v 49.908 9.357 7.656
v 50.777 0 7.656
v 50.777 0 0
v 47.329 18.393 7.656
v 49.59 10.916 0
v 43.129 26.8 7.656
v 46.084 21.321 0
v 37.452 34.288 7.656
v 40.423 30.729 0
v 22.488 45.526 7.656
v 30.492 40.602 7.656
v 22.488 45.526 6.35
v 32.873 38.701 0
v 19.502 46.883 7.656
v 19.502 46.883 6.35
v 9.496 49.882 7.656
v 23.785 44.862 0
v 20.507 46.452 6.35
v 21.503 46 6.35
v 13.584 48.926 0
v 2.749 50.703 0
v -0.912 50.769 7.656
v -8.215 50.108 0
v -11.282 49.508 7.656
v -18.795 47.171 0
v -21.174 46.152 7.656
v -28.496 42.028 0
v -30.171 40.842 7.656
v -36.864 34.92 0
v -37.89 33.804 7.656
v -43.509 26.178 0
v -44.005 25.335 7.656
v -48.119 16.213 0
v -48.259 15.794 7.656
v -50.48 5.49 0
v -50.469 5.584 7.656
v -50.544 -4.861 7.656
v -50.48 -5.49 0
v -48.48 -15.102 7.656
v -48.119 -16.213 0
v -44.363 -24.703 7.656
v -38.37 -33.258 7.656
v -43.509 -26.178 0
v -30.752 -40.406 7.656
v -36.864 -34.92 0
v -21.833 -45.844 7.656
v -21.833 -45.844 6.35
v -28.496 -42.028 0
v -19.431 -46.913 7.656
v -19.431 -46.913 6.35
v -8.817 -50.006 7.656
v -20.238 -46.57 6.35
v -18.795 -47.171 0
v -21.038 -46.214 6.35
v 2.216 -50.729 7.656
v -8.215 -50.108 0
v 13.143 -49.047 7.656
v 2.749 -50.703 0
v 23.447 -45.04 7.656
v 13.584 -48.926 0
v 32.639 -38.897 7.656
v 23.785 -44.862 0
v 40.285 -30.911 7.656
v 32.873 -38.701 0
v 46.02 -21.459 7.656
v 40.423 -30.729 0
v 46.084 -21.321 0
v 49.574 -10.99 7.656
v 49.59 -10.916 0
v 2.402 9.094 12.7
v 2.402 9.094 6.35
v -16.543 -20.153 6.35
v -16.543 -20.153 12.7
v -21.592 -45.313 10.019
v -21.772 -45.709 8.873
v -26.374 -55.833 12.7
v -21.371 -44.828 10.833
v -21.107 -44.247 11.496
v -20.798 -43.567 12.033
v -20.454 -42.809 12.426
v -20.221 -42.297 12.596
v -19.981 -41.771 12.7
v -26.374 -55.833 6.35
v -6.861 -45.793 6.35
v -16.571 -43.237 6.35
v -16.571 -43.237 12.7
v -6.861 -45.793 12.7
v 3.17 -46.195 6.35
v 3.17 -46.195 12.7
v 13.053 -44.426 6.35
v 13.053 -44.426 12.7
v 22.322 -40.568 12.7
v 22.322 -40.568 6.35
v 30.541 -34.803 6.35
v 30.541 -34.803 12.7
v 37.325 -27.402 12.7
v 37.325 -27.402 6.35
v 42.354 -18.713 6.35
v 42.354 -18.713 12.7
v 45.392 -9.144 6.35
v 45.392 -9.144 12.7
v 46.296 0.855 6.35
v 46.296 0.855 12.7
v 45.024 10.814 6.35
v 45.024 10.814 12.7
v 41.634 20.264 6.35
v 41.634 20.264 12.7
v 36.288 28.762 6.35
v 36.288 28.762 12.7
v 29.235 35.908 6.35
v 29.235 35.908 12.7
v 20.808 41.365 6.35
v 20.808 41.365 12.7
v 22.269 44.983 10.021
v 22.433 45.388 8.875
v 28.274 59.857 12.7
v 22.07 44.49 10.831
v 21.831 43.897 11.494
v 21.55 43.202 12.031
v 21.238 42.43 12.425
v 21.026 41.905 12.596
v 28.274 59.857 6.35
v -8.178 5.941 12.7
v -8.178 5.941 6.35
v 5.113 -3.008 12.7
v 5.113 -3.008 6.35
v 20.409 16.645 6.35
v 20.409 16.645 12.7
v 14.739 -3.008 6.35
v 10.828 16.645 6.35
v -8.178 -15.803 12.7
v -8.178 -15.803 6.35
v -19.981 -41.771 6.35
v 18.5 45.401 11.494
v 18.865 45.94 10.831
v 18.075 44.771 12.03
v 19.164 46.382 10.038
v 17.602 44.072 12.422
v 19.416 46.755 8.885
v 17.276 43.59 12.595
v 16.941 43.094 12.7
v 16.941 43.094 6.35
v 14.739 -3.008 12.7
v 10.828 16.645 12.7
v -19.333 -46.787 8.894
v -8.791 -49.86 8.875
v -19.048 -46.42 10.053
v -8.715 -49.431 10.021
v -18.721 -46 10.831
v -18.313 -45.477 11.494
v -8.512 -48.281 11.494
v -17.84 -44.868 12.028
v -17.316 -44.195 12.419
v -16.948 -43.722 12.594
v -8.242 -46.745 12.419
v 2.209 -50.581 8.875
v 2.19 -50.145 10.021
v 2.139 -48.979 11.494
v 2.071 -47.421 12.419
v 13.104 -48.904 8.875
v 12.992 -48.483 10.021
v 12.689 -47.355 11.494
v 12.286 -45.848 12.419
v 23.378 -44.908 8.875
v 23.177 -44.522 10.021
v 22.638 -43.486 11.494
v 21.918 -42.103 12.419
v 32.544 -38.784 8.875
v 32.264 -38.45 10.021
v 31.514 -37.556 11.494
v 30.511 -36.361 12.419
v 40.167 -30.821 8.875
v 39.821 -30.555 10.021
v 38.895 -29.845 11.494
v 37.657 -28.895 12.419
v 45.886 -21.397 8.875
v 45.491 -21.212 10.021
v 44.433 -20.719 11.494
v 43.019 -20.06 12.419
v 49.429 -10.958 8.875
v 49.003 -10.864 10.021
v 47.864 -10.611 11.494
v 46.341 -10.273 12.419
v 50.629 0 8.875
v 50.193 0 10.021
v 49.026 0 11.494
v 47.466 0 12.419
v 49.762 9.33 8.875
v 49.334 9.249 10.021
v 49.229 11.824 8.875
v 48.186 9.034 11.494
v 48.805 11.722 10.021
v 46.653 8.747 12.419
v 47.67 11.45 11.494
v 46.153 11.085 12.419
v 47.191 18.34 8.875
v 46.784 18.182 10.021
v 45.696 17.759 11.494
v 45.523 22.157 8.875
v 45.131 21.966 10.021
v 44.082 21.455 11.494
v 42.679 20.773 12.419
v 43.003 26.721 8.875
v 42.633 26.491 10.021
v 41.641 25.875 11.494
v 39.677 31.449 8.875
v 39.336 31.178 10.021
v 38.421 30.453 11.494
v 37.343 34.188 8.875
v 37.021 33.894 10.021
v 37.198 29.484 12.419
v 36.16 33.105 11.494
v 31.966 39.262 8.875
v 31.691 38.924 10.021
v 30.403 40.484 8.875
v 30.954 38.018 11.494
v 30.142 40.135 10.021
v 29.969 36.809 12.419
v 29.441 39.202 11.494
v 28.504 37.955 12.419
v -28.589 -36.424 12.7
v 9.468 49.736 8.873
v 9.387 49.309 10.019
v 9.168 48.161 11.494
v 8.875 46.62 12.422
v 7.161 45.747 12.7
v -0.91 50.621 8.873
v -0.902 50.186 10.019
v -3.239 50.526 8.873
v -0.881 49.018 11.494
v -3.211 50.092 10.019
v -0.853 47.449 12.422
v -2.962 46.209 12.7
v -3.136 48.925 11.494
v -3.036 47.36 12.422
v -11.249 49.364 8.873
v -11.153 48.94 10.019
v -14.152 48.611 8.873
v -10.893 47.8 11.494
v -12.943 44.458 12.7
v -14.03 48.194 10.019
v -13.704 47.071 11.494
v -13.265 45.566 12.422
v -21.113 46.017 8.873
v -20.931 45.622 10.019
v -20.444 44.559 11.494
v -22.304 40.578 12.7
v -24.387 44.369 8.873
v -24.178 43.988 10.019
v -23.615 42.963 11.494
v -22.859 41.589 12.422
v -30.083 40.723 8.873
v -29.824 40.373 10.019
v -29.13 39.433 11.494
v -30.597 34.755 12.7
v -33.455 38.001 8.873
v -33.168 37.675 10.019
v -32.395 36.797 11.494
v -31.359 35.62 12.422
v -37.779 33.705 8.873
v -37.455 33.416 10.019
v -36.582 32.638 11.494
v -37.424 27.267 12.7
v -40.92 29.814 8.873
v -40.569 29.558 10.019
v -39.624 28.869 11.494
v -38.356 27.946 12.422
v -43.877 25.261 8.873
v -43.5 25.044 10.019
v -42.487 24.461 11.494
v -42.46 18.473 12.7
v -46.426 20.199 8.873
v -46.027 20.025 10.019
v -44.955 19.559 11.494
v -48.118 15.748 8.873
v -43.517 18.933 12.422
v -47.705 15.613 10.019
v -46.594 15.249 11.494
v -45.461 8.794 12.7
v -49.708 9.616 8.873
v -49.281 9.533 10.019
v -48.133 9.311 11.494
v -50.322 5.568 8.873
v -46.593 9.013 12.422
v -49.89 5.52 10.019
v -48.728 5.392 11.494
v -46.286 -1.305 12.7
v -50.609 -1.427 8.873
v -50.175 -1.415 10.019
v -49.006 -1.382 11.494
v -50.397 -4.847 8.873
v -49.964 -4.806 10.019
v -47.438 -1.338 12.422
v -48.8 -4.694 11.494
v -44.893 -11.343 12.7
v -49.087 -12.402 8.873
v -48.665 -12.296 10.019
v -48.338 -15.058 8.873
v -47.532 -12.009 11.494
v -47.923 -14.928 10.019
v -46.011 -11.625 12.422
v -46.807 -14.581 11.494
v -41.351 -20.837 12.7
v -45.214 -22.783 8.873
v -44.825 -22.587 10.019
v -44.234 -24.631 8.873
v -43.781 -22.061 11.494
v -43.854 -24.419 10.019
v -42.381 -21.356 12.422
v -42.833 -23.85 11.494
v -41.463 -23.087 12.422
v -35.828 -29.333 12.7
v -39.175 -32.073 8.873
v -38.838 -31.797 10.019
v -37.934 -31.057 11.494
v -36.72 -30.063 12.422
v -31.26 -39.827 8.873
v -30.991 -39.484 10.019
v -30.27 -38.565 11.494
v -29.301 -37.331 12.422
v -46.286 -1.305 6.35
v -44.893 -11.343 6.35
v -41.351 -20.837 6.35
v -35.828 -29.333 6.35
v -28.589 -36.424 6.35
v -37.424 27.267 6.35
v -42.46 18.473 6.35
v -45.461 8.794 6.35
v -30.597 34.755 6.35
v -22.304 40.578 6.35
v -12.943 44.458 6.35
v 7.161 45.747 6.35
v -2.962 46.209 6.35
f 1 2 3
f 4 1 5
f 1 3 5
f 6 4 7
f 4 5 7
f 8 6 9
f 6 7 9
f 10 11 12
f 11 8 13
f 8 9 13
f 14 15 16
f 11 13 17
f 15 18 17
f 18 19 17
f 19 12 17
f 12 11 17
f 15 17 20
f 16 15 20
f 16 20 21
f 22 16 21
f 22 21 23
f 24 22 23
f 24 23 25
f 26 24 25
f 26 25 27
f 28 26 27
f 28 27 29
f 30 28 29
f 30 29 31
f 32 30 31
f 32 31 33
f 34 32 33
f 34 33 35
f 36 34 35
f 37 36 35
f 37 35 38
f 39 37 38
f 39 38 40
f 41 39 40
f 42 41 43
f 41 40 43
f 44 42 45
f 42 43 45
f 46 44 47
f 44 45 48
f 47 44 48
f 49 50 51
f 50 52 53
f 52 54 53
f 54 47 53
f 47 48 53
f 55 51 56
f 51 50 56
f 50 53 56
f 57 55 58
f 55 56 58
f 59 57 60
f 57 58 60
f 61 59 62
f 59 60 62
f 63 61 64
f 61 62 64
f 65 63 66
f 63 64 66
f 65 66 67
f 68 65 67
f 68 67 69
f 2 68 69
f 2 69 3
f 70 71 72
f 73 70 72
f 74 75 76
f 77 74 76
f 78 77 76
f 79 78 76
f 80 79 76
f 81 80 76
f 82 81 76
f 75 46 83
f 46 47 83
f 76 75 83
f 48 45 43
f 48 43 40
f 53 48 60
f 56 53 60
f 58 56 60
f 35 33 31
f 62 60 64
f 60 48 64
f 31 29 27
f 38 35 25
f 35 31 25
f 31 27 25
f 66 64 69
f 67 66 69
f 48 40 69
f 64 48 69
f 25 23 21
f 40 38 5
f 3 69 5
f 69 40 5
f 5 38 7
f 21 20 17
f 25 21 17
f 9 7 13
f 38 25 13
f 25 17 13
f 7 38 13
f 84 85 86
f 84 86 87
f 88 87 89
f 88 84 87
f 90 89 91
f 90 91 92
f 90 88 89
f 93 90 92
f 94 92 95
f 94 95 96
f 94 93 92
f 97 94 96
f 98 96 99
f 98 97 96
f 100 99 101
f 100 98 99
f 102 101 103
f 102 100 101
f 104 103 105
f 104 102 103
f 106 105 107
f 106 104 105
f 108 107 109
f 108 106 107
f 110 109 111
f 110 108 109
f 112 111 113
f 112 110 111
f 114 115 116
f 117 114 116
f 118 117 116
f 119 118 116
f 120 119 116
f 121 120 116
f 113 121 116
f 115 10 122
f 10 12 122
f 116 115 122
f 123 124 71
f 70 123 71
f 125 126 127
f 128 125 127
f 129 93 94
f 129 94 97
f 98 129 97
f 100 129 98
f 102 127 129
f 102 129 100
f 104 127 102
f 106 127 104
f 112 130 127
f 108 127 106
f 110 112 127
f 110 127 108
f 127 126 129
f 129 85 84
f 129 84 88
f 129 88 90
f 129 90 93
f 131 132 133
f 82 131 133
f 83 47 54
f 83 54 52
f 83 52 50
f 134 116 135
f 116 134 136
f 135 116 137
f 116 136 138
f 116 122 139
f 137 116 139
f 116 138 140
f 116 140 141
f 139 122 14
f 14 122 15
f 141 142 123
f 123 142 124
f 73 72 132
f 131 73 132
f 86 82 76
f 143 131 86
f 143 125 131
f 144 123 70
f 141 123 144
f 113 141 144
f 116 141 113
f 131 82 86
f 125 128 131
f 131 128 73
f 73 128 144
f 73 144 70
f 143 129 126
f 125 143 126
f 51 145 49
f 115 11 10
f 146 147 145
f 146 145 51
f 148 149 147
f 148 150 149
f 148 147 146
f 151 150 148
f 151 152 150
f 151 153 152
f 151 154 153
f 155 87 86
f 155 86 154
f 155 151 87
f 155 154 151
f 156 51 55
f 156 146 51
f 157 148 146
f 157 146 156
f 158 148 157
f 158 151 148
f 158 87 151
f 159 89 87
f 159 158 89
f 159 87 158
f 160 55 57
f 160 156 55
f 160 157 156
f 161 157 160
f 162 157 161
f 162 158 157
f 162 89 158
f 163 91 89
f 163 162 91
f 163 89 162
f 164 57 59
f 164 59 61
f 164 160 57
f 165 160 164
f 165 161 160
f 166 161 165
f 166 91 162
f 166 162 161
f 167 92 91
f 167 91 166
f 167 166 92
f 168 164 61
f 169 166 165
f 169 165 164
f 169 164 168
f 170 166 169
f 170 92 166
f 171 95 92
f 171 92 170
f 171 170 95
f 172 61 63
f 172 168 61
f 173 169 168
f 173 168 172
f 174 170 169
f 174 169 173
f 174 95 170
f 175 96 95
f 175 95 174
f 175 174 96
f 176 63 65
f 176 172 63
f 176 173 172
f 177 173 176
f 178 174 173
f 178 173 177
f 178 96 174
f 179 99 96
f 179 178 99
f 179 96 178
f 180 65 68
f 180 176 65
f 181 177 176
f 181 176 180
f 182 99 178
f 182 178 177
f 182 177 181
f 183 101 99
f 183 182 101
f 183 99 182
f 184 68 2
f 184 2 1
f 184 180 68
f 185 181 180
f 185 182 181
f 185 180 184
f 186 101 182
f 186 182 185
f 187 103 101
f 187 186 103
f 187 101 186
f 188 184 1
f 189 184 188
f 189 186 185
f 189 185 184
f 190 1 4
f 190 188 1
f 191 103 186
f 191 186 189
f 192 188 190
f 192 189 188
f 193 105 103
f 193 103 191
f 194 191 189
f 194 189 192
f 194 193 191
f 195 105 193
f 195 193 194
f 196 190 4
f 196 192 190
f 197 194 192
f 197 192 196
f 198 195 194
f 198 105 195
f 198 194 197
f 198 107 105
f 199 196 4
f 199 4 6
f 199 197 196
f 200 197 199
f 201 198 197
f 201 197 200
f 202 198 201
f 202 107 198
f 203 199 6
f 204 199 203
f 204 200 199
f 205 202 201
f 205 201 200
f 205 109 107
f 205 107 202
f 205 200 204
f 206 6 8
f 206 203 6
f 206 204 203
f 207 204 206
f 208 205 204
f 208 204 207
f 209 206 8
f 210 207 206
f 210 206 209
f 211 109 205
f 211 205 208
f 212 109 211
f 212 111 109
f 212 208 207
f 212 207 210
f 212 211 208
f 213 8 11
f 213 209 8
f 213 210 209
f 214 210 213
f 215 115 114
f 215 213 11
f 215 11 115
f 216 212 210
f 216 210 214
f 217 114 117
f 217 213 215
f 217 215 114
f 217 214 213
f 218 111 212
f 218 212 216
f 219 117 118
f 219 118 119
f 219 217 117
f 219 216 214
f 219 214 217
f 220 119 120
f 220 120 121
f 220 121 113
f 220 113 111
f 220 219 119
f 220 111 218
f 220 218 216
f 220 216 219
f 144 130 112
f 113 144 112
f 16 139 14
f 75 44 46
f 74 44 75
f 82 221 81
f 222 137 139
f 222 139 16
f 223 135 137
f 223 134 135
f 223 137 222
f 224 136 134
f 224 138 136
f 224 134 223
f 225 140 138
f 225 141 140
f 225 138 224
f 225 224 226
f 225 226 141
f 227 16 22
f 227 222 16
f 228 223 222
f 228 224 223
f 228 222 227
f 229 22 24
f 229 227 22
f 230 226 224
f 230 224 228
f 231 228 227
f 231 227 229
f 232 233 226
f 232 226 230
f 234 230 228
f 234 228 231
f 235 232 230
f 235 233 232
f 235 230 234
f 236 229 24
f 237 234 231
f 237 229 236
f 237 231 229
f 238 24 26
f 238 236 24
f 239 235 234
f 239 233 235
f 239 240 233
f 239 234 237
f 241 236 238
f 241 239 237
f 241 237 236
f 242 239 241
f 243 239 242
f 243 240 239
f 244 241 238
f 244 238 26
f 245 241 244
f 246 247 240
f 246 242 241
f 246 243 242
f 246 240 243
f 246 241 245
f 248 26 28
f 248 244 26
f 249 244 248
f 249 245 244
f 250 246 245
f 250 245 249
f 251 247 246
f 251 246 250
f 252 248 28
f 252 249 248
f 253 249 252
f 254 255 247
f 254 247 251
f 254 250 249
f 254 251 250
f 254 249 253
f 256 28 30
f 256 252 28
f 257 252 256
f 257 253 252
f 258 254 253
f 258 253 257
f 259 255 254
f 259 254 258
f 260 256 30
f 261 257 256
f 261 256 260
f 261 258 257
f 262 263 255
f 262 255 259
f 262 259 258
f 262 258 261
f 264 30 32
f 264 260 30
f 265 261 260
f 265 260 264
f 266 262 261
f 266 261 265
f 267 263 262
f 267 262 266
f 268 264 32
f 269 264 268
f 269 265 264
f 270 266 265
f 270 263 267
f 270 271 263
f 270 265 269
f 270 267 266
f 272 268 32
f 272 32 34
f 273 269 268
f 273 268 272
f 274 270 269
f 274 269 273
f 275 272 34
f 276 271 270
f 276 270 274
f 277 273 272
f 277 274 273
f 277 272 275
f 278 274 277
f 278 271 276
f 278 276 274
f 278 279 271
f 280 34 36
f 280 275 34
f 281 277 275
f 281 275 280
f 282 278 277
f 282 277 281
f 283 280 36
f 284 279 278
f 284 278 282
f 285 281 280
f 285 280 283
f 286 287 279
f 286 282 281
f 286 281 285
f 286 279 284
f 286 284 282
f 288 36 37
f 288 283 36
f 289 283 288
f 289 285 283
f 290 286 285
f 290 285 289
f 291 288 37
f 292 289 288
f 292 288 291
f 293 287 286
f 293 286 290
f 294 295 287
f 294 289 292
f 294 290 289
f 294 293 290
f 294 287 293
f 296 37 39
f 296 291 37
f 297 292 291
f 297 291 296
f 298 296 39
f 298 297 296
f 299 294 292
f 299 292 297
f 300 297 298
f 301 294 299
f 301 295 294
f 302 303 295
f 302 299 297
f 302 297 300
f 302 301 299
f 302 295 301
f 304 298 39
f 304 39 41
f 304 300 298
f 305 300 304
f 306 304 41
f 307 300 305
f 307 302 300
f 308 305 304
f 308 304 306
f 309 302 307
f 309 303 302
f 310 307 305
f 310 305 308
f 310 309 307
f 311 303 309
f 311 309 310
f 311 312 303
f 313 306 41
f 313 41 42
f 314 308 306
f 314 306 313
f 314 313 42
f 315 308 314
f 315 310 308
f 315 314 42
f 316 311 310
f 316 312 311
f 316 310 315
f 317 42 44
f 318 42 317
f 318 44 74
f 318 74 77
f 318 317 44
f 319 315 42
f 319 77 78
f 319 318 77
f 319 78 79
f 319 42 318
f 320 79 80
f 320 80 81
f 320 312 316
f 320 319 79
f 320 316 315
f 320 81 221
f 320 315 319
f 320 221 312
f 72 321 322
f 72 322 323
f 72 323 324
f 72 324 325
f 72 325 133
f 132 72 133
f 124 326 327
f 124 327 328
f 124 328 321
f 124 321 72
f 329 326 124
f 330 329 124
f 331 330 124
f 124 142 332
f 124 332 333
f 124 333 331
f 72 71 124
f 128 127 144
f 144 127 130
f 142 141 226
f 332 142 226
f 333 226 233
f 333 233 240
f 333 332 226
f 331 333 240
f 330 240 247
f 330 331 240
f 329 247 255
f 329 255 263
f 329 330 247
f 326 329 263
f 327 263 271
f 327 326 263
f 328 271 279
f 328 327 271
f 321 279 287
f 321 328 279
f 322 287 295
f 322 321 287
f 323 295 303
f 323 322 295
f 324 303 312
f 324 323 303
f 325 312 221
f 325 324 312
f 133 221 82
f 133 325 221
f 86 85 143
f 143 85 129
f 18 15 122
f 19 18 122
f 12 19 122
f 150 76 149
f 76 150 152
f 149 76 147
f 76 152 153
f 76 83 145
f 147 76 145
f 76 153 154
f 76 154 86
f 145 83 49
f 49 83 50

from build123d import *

# Parameters (mm, degrees)
F0_R     = 46.303997109
F1_DEPTH = 6.35
F0_R_2   = 50.7773250867
F2_DEPTH = 12.7
F5_DEPTH = 6.35


# Not quite as in the source:
# - a fillet or chamfer that OpenCascade refuses, or shapes differently, is made with other operations: its cross-section is extruded or revolved along the edge and cut away or added


with BuildPart() as f1:
    # F0 (on Top) → F1 (new body)
    with BuildSketch(Plane.XY):
        Circle(F0_R)
    extrude(amount=F1_DEPTH)

    # F0 (on Top) → F2 (join)
    with BuildSketch(Plane.XY):
        Circle(F0_R_2)
        Circle(F0_R, mode=Mode.SUBTRACT)
    extrude(amount=F2_DEPTH)

    # F3: fillet of radius 5.08 on 1 edges, made by hand

    # F3_s1 → F3_t2 (revolve, cut)
    with BuildSketch(Plane.XZ):
        with BuildLine():
            ThreePointArc((50.7773250867, 7.6563555778), (49.4978706971, 11.0271497073), (46.303997109, 12.7))
            Line((46.303997109, 12.7), (46.3161305494, 12.8008728884))
            ThreePointArc((46.3161305494, 12.8008728884), (48.5406610978, 12.8016), (50.7773250867, 12.8016))
            Line((50.7773250867, 12.8016), (50.8789250867, 12.7))
            Line((50.8789250867, 12.7), (50.8789250867, 7.6563555778))
            Line((50.8789250867, 7.6563555778), (50.7773250867, 7.6563555778))
        make_face()
    revolve(axis=Axis((0, 0, 12.7), (0, 0, 1)), mode=Mode.SUBTRACT)

    # F4 (on face) → F5 (join)
    with BuildSketch(Plane.XY.offset(6.35)):
        Polygon((-8.1779062748, -15.8028278183), (-26.3735784938, -55.8334334653), (14.7386826575, -3.0078946147), (5.1134219393, -3.0078946147), (20.4086864271, 16.6451374931), (10.8284205198, 16.6451374931), (28.2742083073, 59.8571076989), (-8.1779062748, 5.9409798123), (2.4016224779, 9.0941041708), (-16.5434218943, -20.15289478), align=None)
    extrude(amount=F5_DEPTH)


solid = f1.part
